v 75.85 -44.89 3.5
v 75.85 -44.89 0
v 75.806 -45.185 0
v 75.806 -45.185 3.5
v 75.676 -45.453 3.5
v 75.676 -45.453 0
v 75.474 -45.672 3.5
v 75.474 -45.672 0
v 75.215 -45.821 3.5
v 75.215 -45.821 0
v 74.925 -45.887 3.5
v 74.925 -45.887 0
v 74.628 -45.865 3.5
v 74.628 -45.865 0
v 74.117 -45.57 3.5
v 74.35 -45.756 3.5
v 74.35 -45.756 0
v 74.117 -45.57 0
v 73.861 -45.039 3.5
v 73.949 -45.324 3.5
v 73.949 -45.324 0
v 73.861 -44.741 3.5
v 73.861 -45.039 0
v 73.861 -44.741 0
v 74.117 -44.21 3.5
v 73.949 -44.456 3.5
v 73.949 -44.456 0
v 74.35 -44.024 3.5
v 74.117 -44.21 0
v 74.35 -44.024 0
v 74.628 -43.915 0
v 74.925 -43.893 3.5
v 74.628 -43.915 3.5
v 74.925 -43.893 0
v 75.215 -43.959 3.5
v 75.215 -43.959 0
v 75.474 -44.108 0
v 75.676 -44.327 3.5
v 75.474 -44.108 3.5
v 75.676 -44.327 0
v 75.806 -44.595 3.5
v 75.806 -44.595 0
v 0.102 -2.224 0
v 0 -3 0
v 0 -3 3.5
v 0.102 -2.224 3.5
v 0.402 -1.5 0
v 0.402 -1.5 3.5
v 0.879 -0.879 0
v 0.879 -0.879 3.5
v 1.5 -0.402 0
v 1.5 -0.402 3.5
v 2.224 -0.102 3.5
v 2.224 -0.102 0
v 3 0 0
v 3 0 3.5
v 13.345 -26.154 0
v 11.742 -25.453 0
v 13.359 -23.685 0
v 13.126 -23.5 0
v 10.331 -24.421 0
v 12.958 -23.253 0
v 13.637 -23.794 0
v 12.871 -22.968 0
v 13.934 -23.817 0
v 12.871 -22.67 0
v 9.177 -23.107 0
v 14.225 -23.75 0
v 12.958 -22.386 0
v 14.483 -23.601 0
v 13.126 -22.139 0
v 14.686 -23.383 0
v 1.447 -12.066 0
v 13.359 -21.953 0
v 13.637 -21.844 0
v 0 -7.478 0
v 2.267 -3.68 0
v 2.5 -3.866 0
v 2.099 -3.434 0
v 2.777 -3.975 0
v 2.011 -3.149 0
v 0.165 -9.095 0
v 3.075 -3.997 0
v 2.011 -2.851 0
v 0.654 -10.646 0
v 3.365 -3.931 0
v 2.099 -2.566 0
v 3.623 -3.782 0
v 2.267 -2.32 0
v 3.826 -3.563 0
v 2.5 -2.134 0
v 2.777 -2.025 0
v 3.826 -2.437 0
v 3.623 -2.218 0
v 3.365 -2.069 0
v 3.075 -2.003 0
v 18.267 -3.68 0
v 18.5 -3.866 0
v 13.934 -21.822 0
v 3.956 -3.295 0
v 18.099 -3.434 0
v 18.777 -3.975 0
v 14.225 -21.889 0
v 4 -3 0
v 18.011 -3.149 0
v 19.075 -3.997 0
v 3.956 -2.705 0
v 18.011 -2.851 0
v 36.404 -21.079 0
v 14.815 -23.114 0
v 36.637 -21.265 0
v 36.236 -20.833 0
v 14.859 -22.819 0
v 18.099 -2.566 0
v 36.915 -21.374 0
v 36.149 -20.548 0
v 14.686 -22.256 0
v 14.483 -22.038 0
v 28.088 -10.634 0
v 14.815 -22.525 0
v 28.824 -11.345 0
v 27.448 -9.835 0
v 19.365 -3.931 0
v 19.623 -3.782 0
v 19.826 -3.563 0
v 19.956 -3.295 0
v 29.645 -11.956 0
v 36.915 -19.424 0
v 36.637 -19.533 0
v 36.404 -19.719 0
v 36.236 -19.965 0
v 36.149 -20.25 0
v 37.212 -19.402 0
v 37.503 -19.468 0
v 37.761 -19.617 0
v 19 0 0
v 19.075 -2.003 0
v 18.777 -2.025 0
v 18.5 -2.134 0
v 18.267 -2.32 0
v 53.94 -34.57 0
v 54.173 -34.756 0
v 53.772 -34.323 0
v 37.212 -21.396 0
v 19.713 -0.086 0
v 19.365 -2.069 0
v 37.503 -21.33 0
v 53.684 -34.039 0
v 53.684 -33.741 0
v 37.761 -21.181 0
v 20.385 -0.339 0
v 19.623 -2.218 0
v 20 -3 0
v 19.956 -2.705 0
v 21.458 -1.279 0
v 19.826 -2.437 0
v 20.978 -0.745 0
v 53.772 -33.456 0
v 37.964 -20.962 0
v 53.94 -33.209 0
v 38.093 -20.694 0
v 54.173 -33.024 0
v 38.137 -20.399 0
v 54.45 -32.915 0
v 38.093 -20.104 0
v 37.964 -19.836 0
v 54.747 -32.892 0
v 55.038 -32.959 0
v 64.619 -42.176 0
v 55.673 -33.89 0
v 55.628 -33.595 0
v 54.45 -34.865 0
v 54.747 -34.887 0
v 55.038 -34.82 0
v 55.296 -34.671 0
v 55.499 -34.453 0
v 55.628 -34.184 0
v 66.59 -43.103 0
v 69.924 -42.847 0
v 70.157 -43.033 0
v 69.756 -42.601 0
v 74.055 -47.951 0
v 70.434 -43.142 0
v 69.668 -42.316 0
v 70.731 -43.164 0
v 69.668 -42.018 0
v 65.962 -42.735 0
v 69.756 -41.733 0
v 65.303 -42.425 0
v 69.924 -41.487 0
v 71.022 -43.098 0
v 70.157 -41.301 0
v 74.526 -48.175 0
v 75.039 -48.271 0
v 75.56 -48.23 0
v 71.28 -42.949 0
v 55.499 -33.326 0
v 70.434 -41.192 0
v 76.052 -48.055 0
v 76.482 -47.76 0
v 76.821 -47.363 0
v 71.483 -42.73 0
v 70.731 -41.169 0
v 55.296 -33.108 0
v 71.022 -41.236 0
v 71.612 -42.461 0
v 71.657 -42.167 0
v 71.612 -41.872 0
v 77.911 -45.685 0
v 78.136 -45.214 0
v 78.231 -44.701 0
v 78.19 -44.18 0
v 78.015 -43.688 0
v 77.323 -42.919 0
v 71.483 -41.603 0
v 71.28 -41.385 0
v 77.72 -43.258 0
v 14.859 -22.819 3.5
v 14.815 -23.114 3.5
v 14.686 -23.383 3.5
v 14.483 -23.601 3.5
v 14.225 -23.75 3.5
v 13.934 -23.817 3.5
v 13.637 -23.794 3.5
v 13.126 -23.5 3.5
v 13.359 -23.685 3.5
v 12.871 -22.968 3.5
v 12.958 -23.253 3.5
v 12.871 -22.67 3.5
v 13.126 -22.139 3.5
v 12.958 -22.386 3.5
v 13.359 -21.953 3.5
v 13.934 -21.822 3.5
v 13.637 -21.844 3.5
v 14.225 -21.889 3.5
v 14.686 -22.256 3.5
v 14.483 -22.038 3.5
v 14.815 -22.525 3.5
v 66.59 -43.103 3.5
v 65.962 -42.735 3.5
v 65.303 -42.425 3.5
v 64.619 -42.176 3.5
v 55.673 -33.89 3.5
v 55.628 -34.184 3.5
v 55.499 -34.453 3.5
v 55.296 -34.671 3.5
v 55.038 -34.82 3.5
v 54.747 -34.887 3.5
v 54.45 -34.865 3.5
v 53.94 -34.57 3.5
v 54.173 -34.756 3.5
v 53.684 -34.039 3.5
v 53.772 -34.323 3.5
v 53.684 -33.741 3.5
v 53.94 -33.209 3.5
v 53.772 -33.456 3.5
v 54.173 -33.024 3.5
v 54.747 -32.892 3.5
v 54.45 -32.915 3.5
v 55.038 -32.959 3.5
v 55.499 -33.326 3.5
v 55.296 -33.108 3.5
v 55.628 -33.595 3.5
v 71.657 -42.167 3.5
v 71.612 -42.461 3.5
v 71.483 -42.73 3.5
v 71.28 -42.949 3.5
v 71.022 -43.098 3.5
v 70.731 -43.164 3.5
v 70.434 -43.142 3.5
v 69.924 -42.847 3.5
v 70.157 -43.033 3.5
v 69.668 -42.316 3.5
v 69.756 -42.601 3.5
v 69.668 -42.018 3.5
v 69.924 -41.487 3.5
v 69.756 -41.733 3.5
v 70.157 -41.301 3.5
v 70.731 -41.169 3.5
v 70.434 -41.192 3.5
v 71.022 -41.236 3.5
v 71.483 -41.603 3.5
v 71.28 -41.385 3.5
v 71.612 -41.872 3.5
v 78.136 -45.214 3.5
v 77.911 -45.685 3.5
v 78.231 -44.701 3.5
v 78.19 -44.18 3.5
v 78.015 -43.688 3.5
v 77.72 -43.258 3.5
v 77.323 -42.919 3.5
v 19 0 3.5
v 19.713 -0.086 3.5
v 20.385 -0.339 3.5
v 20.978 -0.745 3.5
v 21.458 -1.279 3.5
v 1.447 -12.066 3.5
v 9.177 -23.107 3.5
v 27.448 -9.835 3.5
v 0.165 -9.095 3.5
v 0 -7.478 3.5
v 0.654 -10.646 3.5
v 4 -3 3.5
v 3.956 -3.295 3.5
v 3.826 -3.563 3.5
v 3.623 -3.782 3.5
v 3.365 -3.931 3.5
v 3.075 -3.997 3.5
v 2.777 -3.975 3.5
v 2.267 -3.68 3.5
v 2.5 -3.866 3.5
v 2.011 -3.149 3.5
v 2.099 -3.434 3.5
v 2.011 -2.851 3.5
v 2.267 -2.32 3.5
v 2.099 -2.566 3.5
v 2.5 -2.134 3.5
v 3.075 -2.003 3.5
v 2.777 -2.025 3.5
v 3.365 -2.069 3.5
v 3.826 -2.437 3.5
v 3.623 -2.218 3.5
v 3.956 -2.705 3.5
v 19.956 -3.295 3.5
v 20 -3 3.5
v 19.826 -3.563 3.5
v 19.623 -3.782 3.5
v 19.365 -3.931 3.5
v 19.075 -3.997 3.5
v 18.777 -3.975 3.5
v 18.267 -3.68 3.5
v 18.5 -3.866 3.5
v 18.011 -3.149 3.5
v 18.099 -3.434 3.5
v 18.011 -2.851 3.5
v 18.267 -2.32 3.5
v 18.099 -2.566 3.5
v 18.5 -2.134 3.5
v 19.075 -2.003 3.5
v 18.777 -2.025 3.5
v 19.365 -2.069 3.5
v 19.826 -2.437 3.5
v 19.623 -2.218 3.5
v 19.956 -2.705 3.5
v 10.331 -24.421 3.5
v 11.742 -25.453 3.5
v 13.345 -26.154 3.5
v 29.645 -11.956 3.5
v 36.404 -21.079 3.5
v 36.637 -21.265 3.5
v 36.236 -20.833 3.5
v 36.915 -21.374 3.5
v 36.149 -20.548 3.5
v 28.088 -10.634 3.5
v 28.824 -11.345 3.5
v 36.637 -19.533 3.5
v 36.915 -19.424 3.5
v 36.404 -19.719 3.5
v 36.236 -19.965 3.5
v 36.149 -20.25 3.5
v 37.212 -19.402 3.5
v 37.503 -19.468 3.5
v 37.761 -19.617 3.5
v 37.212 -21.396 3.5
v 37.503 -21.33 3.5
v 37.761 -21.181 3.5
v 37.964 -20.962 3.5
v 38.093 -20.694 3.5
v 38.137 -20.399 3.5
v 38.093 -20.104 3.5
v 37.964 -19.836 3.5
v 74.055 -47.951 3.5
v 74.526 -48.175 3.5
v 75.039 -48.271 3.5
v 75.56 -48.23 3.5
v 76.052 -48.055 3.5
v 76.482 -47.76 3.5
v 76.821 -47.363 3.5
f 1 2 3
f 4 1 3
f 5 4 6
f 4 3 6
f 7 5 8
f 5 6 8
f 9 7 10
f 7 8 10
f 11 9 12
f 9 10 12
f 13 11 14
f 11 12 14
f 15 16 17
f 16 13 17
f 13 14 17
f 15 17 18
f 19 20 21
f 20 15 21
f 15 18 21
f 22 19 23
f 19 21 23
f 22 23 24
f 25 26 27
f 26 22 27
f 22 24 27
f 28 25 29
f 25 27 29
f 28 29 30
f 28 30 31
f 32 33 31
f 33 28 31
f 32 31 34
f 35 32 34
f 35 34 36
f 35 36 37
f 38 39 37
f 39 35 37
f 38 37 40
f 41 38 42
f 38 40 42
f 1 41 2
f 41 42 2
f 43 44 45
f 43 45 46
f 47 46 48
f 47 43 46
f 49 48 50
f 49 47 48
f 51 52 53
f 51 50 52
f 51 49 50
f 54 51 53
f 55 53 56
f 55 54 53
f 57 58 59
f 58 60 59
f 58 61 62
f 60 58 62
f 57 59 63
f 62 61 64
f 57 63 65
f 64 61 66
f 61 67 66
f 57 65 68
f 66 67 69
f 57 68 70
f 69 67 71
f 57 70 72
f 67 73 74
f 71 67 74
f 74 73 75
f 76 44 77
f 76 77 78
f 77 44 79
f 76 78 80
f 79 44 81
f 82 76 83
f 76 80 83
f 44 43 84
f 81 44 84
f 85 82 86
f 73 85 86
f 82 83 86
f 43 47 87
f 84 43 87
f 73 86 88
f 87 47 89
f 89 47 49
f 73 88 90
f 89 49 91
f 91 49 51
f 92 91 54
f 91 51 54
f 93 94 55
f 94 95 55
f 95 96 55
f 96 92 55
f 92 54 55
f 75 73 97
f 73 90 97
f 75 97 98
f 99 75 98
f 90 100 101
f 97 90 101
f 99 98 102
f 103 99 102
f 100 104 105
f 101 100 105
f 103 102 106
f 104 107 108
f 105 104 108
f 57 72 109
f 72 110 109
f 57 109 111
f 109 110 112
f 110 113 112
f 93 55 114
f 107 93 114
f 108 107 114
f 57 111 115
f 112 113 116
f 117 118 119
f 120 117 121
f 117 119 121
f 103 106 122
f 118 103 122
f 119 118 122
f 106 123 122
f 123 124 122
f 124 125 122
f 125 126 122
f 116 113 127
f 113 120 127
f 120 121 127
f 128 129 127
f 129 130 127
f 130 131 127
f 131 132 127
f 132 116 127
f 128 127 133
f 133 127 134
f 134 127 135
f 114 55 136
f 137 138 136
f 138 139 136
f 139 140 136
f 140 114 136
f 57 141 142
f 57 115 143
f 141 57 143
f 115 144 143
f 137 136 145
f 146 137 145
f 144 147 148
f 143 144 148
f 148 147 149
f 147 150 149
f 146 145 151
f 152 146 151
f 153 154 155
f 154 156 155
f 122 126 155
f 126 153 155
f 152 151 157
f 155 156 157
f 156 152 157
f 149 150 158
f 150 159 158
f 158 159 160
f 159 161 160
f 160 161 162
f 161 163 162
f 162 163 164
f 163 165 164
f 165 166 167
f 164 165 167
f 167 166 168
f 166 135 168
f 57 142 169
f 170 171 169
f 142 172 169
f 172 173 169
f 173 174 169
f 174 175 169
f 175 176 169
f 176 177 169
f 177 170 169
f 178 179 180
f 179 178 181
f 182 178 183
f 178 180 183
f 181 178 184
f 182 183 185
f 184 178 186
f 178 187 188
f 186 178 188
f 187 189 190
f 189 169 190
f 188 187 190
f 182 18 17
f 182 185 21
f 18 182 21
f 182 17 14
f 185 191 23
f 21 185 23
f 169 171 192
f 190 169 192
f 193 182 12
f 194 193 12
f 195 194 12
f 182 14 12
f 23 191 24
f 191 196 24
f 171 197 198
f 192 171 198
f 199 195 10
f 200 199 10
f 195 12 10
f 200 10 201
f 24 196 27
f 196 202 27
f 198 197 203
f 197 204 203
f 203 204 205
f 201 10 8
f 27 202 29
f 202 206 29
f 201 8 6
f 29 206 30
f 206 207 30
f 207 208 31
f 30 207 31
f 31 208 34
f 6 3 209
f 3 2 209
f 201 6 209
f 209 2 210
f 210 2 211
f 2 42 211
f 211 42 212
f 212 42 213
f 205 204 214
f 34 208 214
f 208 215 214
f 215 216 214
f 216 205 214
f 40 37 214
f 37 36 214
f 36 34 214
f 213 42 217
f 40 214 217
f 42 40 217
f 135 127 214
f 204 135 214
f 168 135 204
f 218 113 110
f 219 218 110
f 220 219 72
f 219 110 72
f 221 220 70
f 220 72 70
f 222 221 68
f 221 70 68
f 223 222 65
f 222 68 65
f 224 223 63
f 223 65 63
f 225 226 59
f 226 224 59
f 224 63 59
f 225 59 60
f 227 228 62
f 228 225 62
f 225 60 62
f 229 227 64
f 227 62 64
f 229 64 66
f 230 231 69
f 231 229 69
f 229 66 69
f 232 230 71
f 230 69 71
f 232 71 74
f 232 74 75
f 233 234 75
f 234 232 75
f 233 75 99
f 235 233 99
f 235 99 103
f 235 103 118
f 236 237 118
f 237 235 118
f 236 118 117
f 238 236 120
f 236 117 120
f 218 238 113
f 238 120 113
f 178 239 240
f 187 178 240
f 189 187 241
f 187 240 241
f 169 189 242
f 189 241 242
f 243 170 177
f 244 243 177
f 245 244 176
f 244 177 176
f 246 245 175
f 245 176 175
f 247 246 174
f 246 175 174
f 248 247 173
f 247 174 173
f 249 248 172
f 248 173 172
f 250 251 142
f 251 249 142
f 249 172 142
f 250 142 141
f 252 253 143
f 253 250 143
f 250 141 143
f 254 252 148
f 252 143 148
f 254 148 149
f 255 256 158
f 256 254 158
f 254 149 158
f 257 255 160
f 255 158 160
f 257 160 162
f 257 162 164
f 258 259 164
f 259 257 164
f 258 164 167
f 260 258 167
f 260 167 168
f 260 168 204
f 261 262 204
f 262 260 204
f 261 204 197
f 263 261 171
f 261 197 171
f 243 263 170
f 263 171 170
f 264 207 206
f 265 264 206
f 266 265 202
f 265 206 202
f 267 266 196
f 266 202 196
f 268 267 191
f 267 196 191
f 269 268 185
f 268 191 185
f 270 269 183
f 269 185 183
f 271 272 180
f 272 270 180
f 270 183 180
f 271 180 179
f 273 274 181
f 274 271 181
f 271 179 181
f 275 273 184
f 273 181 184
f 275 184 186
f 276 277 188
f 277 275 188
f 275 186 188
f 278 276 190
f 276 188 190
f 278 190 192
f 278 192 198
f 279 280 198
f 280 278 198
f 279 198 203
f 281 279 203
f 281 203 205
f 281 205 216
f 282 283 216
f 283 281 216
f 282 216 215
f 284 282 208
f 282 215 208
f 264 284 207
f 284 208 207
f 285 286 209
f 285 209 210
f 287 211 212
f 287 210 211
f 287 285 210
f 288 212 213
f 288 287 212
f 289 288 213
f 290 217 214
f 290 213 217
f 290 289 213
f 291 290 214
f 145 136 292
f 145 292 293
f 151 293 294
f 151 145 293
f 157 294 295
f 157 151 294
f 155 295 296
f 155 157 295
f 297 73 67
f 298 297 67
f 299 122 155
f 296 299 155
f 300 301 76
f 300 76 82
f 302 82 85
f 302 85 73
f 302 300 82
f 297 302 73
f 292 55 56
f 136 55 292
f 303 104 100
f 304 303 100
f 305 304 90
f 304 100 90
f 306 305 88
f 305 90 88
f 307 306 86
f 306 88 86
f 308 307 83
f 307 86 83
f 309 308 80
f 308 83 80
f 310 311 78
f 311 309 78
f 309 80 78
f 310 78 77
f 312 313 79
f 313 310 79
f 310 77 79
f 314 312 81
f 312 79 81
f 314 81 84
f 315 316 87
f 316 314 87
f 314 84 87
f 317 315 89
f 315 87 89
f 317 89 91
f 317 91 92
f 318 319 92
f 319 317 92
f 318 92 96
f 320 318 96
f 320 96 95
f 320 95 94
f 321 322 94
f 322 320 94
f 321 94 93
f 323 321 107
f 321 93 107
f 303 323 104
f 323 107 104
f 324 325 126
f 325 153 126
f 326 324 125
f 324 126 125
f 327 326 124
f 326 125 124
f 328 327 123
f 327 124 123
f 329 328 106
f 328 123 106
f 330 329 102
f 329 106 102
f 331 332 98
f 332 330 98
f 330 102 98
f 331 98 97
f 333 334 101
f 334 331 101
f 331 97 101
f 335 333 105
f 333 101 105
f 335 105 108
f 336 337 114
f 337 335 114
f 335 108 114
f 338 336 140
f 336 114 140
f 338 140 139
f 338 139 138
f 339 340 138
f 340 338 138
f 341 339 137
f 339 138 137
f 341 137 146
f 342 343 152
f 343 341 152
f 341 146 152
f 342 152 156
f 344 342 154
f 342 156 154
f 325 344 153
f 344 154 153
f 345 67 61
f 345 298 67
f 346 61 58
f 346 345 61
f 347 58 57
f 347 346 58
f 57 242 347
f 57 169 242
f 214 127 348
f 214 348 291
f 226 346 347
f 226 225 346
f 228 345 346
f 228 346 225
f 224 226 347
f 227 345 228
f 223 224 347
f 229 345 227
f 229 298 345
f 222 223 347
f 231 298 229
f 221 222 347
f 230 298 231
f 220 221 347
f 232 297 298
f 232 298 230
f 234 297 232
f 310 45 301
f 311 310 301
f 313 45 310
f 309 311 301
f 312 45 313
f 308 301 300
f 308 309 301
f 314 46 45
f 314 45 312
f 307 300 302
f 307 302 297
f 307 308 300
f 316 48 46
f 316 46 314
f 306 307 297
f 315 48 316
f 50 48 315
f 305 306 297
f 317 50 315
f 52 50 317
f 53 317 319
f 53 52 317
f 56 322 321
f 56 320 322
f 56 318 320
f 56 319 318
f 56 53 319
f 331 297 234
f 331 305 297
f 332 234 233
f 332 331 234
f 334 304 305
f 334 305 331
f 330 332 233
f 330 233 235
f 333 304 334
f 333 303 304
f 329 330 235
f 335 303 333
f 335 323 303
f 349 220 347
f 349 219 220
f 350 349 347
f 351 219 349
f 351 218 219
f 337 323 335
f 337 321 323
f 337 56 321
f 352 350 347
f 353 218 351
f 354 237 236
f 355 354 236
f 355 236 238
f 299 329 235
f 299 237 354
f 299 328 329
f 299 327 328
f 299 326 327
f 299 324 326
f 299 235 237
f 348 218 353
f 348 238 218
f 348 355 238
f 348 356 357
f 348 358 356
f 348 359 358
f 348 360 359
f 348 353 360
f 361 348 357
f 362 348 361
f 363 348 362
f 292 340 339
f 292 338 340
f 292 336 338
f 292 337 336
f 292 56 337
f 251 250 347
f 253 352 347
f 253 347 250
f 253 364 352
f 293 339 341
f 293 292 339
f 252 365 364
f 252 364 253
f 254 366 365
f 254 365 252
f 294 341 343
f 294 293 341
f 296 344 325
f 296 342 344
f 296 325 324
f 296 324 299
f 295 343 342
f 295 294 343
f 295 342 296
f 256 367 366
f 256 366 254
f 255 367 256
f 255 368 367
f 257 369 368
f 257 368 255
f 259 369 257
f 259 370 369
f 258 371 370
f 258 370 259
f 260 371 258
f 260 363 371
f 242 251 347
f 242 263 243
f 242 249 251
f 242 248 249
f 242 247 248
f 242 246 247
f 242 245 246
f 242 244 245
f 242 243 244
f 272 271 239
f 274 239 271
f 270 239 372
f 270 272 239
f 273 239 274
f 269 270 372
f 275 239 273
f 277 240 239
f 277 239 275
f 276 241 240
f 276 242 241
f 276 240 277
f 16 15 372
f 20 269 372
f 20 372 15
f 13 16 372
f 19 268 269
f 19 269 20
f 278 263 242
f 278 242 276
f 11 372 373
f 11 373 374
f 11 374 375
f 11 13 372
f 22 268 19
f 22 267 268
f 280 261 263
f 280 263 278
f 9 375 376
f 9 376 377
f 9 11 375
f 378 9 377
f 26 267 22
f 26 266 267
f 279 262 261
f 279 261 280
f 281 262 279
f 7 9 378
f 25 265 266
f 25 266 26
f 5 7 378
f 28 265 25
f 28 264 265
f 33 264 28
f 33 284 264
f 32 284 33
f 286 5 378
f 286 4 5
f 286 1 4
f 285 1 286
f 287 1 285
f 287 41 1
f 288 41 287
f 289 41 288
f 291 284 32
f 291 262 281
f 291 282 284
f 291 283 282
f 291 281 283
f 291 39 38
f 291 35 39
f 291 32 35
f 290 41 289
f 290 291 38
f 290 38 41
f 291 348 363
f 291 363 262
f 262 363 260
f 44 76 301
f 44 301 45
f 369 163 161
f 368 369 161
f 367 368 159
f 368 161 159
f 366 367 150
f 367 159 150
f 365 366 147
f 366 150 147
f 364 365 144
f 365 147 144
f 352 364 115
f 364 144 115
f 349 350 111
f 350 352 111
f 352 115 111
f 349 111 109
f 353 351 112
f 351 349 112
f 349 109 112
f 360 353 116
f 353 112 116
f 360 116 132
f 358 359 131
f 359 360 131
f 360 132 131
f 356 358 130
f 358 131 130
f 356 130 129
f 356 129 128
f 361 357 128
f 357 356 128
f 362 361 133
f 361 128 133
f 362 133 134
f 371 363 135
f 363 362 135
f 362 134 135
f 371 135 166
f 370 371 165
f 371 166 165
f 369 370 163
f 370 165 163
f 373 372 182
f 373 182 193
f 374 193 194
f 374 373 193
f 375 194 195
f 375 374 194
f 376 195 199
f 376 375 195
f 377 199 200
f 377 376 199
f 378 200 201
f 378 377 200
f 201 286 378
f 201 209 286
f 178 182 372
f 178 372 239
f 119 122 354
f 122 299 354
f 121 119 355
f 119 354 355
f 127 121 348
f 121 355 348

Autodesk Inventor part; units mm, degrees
ref_plane "YZ Plane" through (0, 0, 0) normal (1, 0, 0) x (0, 1, 0)
ref_plane "XZ Plane" through (0, 0, 0) normal (0, 1, 0) x (-1, 0, 0)
ref_plane "XY Plane" through (0, 0, 0) normal (0, 0, 1) x (1, 0, 0)
sketch "Sketch1" plane through (0, 0, 0) normal (0, 0, 1) x (1, 0, 0)
  line L0 (0, 0) -> (22, 0)
  circle A0 centre (3, -3) radius 1
  circle A1 centre (19, -3) radius 1
  circle A2 centre (19, -3) radius 3
  circle A3 centre (3, -3) radius 3
  line L1 (0, -10) -> (27.5638, -10) construction
  line L2 (22, 0) -> (30.0637, -11.5162) construction
  line L3 (22, 0) -> (36.0586, 0) construction
  line L4 (0, -10) -> (0, -3)
  line L5 (28.3404, -11.1091) -> (21.4575, -1.2793)
  line L6 (0, -10) -> (10.7416, -25.3406)
  circle A4 centre (26.0021, -13) radius 1 construction
  line L7 (28.3404, -11.1091) -> (79, -44.0078)
  line L8 (28.3404, -11.1091) -> (26.0021, -13) construction
  line L9 (26.0021, -13) -> (10.7416, -25.3406) construction
  circle A5 centre (13.8594, -22.8194) radius 1
  line L10 (79, -101.0698) -> (79, 42.0759) construction
  line L11 (79, -44.0078) -> (75.7322, -49.0399)
  circle A6 centre (74.8501, -44.8899) radius 1
  line L12 (75.7322, -49.0399) -> (65.6681, -42.5042)
  circle A7 centre (70.6567, -42.1667) radius 1
  line L13 (65.6681, -42.5042) -> (10.7416, -25.3406)
  circle A8 centre (13.8594, -22.8194) radius 3 construction
  circle A9 centre (26.0021, -13) radius 3 construction
  line L14 (67.4577, -36.7773) -> (-2.3075, -14.9769) construction
  line L15 (-2.3075, -14.9769) -> (-9.5668, -6) construction
  line L16 (90.7322, -58.781) -> (24.0944, -15.5059) construction
  line L17 (24.0944, -15.5059) -> (16.5425, -4.7207) construction
  line L18 (47.0108, -30.388) -> (1.9372, -16.3033) construction
  line L19 (1.9372, -16.3033) -> (12.3526, -7.8807) construction
  line L20 (12.3526, -7.8807) -> (47.0108, -30.388) construction
  line L21 (0, -6) -> (22, -6) construction
  line L22 (-9.5668, -6) -> (17.4383, -6) construction
  line L23 (17.4383, -6) -> (22.4483, -13.155) construction
  line L24 (22.4483, -13.155) -> (6.5898, -25.9792) construction
  line L25 (6.5898, -25.9792) -> (-9.5668, -6) construction
  circle A10 centre (54.6727, -33.8896) radius 1
  circle A11 centre (37.1374, -20.399) radius 1
  circle A12 centre (37.1374, -20.399) radius 3 construction
  point P0 (19, 0)
  point P1 (3, 0)
  dimension "d0" = 22
  dimension "d1" = 2
  dimension "d2" = 2
  dimension "d3" = 16
  dimension "d4" = 3
  dimension "d5" = 3
  dimension "d6" = 2
  dimension "d7" = 2
  dimension "d8" = 10
  dimension "d9" = 55
  dimension "d10" = 2
  dimension "d11" = 13
  dimension "d12" = 3
  dimension "d13" = 158
  dimension "d14" = 2
  dimension "d15" = 4
  dimension "d17" = 60
  dimension "d19" = 2
  dimension "d20" = 6
  dimension "d21" = 3
  dimension "d22" = 3
  dimension "d23" = 12
  dimension "d24" = 6
  dimension "d25" = 2
  dimension "d26" = 5
  dimension "d27" = 12
  dimension "d28" = 3
  dimension "d29" = 2
  dimension "d30" = 2
  dimension "d31" = 6
  dimension "d32" = 6
  dimension "d33" = 6
  dimension "d40" = 2
  dimension "d41" = 18
  dimension "d42" = 2
  dimension "d43" = 6
extrude "Extrusion1" add sketch "Sketch1" along normal blind 3.5
fillet "Fillet2" radius 8 4 edges at (10.7416, -25.3406, 1.75) (0, -10, 1.75) (28.3404, -11.1091, 1.75) (65.6681, -42.5042, 1.75)
fillet "Fillet3" radius 2 2 edges at (79, -44.0078, 1.75) (75.7322, -49.0399, 1.75)
equation "\"d24\" = d20"
properties part number "Tibia_V2"
